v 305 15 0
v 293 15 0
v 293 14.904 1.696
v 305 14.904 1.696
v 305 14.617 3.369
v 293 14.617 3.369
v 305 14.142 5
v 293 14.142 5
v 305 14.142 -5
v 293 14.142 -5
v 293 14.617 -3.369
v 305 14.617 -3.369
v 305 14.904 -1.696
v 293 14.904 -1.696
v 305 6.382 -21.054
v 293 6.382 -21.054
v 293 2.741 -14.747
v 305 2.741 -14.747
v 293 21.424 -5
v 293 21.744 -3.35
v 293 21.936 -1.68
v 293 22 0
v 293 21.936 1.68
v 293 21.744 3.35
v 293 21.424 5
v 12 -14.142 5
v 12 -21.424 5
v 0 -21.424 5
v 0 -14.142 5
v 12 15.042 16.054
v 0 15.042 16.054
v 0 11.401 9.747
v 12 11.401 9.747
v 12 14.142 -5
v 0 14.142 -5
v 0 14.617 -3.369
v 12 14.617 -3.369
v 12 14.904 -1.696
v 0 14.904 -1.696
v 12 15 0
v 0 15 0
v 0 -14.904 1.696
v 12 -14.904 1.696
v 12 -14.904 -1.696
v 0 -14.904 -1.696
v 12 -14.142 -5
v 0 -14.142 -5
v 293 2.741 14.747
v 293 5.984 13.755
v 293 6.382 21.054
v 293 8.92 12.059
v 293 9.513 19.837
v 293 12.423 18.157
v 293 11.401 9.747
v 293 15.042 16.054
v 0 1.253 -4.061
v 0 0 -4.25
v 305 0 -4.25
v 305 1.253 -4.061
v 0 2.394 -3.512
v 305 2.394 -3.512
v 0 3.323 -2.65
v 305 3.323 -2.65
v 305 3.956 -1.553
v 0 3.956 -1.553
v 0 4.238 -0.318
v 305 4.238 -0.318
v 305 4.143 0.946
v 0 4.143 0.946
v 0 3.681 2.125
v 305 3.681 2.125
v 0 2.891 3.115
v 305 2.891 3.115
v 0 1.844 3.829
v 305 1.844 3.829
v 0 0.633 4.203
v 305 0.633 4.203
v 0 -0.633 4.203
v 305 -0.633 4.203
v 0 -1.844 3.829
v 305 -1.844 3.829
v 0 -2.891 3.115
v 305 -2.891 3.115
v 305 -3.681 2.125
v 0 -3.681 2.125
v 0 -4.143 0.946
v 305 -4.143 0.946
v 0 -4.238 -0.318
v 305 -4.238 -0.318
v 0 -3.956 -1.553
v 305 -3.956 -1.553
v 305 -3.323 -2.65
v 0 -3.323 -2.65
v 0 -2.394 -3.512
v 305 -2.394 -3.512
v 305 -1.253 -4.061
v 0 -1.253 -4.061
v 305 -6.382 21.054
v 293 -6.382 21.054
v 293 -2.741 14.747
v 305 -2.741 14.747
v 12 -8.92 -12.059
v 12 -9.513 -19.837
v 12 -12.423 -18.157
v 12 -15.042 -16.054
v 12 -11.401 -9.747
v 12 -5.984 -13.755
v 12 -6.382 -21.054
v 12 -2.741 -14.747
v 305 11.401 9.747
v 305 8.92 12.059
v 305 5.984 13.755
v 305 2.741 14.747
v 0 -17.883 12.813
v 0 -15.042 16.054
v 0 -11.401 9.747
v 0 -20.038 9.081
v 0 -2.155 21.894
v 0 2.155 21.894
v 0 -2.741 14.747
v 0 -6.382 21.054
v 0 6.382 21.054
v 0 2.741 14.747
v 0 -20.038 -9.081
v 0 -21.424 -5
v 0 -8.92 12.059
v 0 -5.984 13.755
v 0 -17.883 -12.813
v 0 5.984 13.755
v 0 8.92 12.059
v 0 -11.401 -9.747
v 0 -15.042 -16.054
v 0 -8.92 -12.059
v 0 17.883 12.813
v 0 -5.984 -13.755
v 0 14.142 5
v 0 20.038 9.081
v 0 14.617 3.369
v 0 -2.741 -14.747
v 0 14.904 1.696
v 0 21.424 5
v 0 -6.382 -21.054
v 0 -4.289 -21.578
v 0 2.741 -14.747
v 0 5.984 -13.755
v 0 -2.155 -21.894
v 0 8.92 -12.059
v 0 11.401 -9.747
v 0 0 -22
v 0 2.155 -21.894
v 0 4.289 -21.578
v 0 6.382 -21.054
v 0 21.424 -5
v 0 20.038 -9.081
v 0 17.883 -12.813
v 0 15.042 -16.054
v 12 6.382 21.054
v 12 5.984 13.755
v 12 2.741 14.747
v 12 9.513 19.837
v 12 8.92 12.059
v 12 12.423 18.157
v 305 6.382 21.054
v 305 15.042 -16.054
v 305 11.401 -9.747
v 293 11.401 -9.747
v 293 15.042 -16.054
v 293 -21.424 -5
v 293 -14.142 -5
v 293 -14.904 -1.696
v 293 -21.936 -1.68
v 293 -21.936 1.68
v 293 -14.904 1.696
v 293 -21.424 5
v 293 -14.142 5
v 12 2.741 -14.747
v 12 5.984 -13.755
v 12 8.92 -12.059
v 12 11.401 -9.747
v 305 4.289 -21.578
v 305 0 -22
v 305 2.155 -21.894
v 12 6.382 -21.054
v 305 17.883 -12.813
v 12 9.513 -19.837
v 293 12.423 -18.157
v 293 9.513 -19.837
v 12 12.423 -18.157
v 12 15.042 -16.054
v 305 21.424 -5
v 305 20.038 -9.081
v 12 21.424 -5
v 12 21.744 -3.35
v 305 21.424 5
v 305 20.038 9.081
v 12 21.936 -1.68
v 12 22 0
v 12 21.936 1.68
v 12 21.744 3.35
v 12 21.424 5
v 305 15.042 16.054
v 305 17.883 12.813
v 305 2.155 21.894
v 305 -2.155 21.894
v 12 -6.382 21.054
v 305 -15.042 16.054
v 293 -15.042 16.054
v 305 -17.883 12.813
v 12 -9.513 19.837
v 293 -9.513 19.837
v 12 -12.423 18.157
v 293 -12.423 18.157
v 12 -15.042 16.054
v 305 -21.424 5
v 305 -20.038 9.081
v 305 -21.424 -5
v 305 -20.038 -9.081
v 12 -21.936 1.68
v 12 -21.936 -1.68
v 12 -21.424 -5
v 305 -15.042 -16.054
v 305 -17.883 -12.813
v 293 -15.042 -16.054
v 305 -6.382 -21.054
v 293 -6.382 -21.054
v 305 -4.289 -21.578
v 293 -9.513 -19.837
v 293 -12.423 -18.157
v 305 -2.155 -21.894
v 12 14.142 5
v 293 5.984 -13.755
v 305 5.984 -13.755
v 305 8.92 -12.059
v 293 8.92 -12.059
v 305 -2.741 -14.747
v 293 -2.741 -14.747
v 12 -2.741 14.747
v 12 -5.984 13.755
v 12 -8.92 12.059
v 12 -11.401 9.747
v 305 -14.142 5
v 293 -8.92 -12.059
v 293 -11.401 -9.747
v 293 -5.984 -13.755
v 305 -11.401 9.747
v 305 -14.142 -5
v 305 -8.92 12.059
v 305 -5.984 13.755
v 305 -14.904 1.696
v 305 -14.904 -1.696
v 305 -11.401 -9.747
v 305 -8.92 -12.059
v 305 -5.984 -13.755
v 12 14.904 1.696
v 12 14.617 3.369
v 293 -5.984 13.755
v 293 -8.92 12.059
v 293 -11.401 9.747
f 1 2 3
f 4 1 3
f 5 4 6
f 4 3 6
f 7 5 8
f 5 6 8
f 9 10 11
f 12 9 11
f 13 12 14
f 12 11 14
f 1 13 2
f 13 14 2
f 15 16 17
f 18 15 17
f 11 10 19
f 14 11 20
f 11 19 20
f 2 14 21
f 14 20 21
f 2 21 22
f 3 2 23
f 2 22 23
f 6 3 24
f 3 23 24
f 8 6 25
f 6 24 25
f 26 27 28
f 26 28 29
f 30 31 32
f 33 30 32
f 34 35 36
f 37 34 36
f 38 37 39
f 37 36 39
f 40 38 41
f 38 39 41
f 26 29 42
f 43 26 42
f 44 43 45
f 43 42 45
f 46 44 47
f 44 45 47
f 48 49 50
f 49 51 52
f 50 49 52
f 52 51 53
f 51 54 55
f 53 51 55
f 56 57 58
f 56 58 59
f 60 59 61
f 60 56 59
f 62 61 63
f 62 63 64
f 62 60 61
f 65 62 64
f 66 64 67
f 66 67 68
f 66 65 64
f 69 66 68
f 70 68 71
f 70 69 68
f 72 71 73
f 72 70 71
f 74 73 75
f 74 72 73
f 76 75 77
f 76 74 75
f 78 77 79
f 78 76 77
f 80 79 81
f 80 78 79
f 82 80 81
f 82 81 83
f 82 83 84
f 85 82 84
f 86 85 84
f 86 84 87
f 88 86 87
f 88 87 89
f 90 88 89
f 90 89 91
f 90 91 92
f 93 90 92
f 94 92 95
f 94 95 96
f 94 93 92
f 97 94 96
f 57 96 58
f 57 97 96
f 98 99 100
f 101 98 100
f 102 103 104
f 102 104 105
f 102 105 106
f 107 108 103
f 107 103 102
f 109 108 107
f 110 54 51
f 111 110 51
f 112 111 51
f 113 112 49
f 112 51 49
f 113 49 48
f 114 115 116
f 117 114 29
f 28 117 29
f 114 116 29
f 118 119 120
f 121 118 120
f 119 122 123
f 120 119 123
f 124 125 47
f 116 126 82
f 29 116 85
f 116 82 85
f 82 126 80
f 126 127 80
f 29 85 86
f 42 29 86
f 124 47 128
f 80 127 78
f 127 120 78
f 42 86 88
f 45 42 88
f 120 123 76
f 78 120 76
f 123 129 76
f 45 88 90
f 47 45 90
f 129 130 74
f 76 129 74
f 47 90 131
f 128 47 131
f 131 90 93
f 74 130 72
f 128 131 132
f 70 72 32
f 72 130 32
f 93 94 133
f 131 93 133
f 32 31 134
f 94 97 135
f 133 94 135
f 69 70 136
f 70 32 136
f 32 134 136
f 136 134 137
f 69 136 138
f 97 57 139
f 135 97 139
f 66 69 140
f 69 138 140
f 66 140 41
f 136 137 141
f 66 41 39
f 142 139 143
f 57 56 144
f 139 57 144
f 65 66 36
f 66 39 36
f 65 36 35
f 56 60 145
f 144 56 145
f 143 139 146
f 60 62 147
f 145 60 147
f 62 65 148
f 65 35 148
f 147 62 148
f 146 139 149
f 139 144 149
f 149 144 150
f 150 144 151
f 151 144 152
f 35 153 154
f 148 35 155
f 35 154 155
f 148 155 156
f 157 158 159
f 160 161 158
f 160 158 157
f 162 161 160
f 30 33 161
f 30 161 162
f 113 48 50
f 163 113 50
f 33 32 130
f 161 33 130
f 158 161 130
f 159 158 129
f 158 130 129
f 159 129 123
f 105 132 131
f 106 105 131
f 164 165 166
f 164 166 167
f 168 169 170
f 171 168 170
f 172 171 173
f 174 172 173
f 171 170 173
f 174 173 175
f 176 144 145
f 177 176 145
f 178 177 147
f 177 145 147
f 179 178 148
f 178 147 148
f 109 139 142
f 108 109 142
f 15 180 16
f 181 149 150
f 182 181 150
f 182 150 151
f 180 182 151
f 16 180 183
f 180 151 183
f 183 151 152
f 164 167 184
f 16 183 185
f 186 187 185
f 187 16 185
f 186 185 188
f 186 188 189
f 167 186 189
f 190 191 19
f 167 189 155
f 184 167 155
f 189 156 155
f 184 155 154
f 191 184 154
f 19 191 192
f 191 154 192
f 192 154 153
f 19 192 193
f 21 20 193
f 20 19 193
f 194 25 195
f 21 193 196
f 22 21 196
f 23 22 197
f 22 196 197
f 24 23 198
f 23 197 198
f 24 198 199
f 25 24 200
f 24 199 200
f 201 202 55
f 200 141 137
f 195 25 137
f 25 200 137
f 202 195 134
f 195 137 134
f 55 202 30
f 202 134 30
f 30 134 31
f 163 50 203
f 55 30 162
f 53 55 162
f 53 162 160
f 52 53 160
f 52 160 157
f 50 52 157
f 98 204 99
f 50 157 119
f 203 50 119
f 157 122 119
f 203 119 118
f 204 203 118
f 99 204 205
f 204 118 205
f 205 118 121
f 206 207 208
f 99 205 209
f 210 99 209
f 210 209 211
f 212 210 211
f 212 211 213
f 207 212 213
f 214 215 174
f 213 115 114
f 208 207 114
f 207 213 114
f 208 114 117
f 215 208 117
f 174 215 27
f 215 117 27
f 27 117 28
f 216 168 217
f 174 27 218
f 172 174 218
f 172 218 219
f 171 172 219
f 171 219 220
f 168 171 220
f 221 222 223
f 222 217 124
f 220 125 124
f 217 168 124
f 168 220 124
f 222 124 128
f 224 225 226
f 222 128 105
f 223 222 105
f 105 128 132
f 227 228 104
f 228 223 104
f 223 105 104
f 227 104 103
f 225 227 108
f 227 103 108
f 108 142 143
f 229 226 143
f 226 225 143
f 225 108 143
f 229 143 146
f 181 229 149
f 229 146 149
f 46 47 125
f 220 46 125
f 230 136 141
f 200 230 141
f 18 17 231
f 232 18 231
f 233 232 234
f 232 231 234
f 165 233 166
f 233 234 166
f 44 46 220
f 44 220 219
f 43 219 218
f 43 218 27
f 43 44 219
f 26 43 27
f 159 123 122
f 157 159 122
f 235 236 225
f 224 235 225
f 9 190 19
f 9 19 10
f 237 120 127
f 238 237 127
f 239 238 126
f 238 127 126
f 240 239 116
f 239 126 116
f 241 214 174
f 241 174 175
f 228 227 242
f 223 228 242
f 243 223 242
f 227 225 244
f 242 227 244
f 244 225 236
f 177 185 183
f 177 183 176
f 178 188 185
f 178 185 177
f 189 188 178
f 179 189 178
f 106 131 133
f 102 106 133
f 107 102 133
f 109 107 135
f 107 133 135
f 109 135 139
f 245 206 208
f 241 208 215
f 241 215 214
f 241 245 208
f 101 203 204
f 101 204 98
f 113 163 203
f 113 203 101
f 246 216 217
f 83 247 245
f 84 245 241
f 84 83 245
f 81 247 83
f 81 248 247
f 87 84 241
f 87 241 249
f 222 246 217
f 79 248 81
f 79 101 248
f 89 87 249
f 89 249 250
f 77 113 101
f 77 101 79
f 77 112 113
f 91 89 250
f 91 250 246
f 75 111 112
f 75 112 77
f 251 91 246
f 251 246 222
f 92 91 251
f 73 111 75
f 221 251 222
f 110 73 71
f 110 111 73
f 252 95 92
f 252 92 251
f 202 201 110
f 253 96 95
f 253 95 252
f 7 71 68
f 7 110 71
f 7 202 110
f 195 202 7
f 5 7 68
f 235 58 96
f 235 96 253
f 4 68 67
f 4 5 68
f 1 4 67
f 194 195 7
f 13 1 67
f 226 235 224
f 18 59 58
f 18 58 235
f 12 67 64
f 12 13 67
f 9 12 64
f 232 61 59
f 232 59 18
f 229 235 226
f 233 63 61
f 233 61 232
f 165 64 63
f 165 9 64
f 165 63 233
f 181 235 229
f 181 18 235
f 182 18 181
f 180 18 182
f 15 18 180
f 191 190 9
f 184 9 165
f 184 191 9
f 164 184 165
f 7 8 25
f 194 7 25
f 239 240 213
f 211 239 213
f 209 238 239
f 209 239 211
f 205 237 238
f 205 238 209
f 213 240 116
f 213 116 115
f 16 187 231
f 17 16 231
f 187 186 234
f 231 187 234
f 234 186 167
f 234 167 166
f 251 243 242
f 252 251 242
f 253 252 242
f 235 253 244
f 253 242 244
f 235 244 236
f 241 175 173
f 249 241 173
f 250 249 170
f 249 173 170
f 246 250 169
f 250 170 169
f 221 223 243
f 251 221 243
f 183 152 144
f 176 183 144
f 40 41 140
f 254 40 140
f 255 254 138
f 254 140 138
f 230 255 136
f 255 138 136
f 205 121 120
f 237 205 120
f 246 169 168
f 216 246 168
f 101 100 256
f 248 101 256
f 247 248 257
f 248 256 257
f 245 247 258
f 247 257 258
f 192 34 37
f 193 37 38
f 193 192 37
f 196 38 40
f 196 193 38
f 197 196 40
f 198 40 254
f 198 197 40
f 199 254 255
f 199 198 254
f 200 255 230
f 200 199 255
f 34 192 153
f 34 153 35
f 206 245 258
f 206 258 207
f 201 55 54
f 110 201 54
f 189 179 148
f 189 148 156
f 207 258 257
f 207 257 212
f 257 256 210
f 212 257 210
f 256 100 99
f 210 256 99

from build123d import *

# Parameters (mm, degrees)
SKETCH1_R           = 22
SKETCH1_R_2         = 4.25
BOSS_EXTRUDE1_DEPTH = 305
CUT_EXTRUDE1_DEPTH  = 12
CUT_EXTRUDE2_START  = -293
CUT_EXTRUDE2_DEPTH  = 12


with BuildPart() as part:
    # Sketch1 → Boss-Extrude1 (new body)
    with BuildSketch(Plane(origin=(0, 0, 0), x_dir=(0, 0, -1), z_dir=(1, 0, 0))):
        Circle(SKETCH1_R)
        Circle(SKETCH1_R_2, mode=Mode.SUBTRACT)
    extrude(amount=BOSS_EXTRUDE1_DEPTH)

    # Sketch2 → Cut-Extrude1 (cut)
    with BuildSketch(Plane.ZY):
        with BuildLine():
            Line((16.053975315, 15.042269662), (9.747448714, 11.401194831))
            ThreePointArc((9.747448714, 11.401194831), (12.990381057, 7.5), (14.747448714, 2.740940793))
            Line((14.747448714, 2.740940793), (21.053975315, 6.382015624))
            ThreePointArc((21.053975315, 6.382015624), (19.052558883, 11), (16.053975315, 15.042269662))
        make_face()
        with BuildLine():
            Line((21.053975315, -6.382015624), (14.747448714, -2.740940793))
            ThreePointArc((14.747448714, -2.740940793), (12.990381057, -7.5), (9.747448714, -11.401194831))
            Line((9.747448714, -11.401194831), (16.053975315, -15.042269662))
            ThreePointArc((16.053975315, -15.042269662), (19.052558883, -11), (21.053975315, -6.382015624))
        make_face()
        with BuildLine():
            ThreePointArc((5, -14.142135624), (0, -15), (-5, -14.142135624))
            Line((-5, -14.142135624), (-5, -21.424285286))
            ThreePointArc((-5, -21.424285286), (0, -22), (5, -21.424285286))
            Line((5, -21.424285286), (5, -14.142135624))
        make_face()
        with BuildLine():
            ThreePointArc((-9.747448714, -11.401194831), (-12.990381057, -7.5), (-14.747448714, -2.740940793))
            Line((-14.747448714, -2.740940793), (-21.053975315, -6.382015624))
            ThreePointArc((-21.053975315, -6.382015624), (-19.052558883, -11), (-16.053975315, -15.042269662))
            Line((-16.053975315, -15.042269662), (-9.747448714, -11.401194831))
        make_face()
        with BuildLine():
            ThreePointArc((-14.747448714, 2.740940793), (-12.990381057, 7.5), (-9.747448714, 11.401194831))
            Line((-9.747448714, 11.401194831), (-16.053975315, 15.042269662))
            ThreePointArc((-16.053975315, 15.042269662), (-19.052558883, 11), (-21.053975315, 6.382015624))
            Line((-21.053975315, 6.382015624), (-14.747448714, 2.740940793))
        make_face()
        with BuildLine():
            Line((0, 22), (0, 15))
            ThreePointArc((0, 15), (2.536529681, 14.783978395), (5, 14.142135624))
            Line((5, 14.142135624), (5, 21.424285286))
            ThreePointArc((5, 21.424285286), (2.516517804, 21.85559741), (0, 22))
        make_face()
        with BuildLine():
            ThreePointArc((-5, 14.142135624), (-2.536529681, 14.783978395), (0, 15))
            Line((0, 15), (0, 22))
            ThreePointArc((0, 22), (-2.516517804, 21.85559741), (-5, 21.424285286))
            Line((-5, 21.424285286), (-5, 14.142135624))
        make_face()
    extrude(amount=-CUT_EXTRUDE1_DEPTH, mode=Mode.SUBTRACT)

    # Sketch2<4> → Cut-Extrude2 (cut)
    with BuildSketch(Plane.ZY.offset(CUT_EXTRUDE2_START)):
        with BuildLine():
            Line((16.053975315, 15.042269662), (9.747448714, 11.401194831))
            ThreePointArc((9.747448714, 11.401194831), (12.990381057, 7.5), (14.747448714, 2.740940793))
            Line((14.747448714, 2.740940793), (21.053975315, 6.382015624))
            ThreePointArc((21.053975315, 6.382015624), (19.052558883, 11), (16.053975315, 15.042269662))
        make_face()
        with BuildLine():
            Line((0, 22), (0, 15))
            ThreePointArc((0, 15), (2.536529681, 14.783978395), (5, 14.142135624))
            Line((5, 14.142135624), (5, 21.424285286))
            ThreePointArc((5, 21.424285286), (2.516517804, 21.85559741), (0, 22))
        make_face()
        with BuildLine():
            ThreePointArc((-5, 14.142135624), (-2.536529681, 14.783978395), (0, 15))
            Line((0, 15), (0, 22))
            ThreePointArc((0, 22), (-2.516517804, 21.85559741), (-5, 21.424285286))
            Line((-5, 21.424285286), (-5, 14.142135624))
        make_face()
        with BuildLine():
            ThreePointArc((-14.747448714, 2.740940793), (-12.990381057, 7.5), (-9.747448714, 11.401194831))
            Line((-9.747448714, 11.401194831), (-16.053975315, 15.042269662))
            ThreePointArc((-16.053975315, 15.042269662), (-19.052558883, 11), (-21.053975315, 6.382015624))
            Line((-21.053975315, 6.382015624), (-14.747448714, 2.740940793))
        make_face()
        with BuildLine():
            ThreePointArc((-9.747448714, -11.401194831), (-12.990381057, -7.5), (-14.747448714, -2.740940793))
            Line((-14.747448714, -2.740940793), (-21.053975315, -6.382015624))
            ThreePointArc((-21.053975315, -6.382015624), (-19.052558883, -11), (-16.053975315, -15.042269662))
            Line((-16.053975315, -15.042269662), (-9.747448714, -11.401194831))
        make_face()
        with BuildLine():
            ThreePointArc((5, -14.142135624), (0, -15), (-5, -14.142135624))
            Line((-5, -14.142135624), (-5, -21.424285286))
            ThreePointArc((-5, -21.424285286), (0, -22), (5, -21.424285286))
            Line((5, -21.424285286), (5, -14.142135624))
        make_face()
        with BuildLine():
            Line((21.053975315, -6.382015624), (14.747448714, -2.740940793))
            ThreePointArc((14.747448714, -2.740940793), (12.990381057, -7.5), (9.747448714, -11.401194831))
            Line((9.747448714, -11.401194831), (16.053975315, -15.042269662))
            ThreePointArc((16.053975315, -15.042269662), (19.052558883, -11), (21.053975315, -6.382015624))
        make_face()
    extrude(amount=-CUT_EXTRUDE2_DEPTH, mode=Mode.SUBTRACT)


solid = part.part
